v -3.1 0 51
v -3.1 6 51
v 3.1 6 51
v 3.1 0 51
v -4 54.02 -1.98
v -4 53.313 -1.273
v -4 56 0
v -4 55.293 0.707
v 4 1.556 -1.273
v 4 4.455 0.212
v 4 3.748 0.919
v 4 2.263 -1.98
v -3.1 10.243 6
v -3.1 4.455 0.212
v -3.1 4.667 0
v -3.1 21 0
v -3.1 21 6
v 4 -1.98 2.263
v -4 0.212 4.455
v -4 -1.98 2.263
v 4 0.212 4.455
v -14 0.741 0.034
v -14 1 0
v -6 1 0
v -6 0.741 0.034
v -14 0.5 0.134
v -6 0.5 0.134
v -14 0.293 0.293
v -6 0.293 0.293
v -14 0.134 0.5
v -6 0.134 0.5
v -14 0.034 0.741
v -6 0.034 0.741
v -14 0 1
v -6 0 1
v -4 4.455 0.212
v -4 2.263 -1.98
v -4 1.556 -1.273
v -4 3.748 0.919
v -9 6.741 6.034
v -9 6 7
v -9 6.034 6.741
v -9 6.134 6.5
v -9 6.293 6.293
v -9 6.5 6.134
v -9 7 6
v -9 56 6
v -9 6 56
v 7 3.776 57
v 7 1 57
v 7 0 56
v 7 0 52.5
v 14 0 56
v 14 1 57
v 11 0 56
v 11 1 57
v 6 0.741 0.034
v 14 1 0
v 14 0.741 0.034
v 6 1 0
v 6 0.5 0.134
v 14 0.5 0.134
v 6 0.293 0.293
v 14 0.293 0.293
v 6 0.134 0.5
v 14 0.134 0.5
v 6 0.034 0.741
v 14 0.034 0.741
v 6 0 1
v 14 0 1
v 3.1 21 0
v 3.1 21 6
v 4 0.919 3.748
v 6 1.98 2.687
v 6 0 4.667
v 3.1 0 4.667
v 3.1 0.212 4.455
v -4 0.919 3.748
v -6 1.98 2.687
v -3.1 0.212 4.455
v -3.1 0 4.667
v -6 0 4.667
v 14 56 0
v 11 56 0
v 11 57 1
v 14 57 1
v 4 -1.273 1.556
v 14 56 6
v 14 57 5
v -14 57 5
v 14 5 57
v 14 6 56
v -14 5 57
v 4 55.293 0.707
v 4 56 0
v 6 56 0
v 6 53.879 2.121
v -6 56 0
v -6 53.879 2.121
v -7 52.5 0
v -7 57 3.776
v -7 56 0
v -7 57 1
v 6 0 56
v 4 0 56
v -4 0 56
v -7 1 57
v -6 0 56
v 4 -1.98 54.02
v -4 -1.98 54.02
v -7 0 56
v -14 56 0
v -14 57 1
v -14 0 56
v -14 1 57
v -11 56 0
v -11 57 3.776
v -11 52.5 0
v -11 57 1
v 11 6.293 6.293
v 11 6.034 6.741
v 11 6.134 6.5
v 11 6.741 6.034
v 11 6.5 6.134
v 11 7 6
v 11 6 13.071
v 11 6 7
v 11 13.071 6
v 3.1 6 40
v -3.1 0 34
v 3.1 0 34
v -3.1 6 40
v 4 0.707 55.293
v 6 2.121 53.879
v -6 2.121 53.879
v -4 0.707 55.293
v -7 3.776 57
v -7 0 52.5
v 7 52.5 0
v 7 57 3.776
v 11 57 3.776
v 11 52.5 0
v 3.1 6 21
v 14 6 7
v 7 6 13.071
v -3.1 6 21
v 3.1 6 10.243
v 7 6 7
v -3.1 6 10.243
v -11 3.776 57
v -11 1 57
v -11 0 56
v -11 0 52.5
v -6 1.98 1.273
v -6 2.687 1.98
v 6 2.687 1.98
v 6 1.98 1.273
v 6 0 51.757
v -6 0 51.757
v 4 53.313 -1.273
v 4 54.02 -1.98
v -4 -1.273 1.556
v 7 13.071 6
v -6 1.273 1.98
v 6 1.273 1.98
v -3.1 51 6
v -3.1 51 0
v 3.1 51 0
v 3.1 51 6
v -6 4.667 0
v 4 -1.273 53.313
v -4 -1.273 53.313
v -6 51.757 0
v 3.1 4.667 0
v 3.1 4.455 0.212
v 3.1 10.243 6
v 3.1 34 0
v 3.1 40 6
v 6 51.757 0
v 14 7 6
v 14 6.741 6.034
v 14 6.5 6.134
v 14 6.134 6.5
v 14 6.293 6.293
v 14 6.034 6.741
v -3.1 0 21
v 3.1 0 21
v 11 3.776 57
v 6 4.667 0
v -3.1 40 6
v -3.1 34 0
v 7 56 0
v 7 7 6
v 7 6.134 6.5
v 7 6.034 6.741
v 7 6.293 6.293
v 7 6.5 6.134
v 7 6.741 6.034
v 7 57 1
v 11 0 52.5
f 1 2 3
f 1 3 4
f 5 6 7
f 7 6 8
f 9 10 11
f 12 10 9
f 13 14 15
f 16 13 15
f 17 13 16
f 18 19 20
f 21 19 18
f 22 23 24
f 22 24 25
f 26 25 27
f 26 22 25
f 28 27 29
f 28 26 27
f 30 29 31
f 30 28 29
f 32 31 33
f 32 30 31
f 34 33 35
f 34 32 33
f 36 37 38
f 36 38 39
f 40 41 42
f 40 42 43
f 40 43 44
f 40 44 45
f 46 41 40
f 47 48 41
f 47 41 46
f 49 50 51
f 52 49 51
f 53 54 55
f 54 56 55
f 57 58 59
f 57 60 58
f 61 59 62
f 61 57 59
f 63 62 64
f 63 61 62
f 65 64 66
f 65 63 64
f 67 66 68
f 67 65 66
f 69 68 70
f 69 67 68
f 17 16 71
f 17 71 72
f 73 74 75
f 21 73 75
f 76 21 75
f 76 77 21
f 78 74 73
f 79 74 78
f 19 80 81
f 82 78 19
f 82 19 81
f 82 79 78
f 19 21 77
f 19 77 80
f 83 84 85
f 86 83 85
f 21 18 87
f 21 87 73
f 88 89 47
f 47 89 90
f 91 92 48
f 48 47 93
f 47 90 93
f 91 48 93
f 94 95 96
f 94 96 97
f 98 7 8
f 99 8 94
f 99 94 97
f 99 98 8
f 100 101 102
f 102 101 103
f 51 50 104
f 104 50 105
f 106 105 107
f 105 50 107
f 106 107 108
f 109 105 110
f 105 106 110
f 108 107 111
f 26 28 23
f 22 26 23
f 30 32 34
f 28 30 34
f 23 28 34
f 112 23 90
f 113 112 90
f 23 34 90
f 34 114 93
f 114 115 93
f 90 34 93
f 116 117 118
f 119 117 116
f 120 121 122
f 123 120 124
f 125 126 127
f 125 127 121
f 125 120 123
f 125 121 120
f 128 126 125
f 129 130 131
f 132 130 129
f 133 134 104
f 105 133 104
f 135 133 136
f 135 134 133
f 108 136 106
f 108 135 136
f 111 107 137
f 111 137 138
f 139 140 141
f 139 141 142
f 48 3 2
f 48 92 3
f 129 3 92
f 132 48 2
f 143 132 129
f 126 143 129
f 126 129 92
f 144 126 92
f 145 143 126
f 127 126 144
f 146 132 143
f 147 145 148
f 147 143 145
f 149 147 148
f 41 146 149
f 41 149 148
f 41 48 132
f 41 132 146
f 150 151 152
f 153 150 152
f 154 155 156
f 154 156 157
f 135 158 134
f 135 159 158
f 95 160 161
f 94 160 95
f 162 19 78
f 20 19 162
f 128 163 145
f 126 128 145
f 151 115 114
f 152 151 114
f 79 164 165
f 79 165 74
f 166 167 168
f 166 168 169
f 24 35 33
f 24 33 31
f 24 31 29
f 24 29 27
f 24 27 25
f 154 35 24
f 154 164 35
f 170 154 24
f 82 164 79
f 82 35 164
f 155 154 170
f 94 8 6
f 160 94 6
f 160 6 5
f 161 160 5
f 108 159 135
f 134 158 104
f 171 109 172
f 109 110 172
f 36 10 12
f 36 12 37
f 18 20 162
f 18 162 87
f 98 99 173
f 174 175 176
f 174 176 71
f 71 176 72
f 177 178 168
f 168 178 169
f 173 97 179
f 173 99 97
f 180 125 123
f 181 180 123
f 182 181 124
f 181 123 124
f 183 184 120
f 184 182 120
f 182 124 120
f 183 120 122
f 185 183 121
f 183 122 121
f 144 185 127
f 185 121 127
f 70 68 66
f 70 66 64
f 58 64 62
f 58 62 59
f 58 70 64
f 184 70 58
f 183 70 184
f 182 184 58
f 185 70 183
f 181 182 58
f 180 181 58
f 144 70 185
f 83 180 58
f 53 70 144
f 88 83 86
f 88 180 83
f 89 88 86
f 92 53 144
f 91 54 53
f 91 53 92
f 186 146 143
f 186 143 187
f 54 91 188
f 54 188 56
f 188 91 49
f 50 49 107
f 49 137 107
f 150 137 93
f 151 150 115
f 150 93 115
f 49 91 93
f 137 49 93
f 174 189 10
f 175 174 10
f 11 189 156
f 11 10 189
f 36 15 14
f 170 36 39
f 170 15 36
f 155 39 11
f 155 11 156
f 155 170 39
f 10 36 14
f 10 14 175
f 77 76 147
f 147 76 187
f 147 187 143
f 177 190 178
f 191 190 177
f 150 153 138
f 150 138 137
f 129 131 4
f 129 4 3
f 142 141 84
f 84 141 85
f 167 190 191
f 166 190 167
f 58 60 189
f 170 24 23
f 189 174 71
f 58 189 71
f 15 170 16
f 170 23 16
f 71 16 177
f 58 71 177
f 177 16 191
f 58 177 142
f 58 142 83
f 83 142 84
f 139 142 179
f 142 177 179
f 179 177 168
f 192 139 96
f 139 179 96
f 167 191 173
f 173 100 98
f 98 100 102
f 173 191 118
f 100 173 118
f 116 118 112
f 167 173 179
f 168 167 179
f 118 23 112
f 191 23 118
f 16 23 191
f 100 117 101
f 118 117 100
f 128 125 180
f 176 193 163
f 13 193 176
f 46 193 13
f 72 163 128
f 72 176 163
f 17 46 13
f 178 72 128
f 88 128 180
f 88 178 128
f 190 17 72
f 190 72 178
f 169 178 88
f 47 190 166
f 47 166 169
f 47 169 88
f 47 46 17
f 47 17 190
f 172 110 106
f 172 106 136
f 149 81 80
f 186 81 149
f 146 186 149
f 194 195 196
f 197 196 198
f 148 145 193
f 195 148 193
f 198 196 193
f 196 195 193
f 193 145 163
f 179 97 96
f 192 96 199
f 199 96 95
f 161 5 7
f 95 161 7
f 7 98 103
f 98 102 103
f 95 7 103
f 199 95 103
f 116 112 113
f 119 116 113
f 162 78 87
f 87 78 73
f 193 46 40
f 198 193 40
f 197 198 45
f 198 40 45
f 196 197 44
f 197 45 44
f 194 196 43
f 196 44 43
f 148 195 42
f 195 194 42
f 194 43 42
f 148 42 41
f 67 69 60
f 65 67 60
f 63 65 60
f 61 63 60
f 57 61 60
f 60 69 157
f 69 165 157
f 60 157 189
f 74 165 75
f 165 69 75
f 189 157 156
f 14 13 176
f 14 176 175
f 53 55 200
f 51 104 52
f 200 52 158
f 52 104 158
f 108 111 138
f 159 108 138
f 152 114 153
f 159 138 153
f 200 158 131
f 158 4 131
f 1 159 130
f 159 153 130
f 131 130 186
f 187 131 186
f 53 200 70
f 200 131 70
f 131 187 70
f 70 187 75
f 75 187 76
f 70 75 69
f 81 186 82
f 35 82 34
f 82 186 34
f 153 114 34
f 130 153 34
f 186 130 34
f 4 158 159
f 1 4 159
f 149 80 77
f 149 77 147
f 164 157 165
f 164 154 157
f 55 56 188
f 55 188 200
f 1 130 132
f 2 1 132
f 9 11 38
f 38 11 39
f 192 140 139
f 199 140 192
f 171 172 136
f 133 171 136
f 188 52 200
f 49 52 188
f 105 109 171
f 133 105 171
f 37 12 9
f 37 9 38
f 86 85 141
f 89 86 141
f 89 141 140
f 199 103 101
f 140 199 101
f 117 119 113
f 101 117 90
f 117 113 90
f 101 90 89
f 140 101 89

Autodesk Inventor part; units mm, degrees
ref_plane "YZ Plane" through (0, 0, 0) normal (1, 0, 0) x (0, 1, 0)
ref_plane "XZ Plane" through (0, 0, 0) normal (0, 1, 0) x (-1, 0, 0)
ref_plane "XY Plane" through (0, 0, 0) normal (0, 0, 1) x (1, 0, 0)
sketch "Sketch_1" plane through (0, 0, 0) normal (1, 0, 0) x (0, 1, 0)
  line L0 (1, 57) -> (0, 56)
  line L1 (0, 56) -> (0, 1)
  arc A0 (0, 1) -> (1, 0) centre (1, 1) ccw
  line L2 (1, 0) -> (56, 0)
  line L3 (56, 0) -> (57, 1)
  line L4 (57, 1) -> (57, 5)
  line L5 (57, 5) -> (5, 57)
  line L6 (5, 57) -> (1, 57)
extrude "Extrusion1" add sketch "Sketch_1" along normal mid plane 28
sketch "Sketch_2" plane through (-9, 0, 0) normal (1, 0, 0) x (0, 0, -1)
  line L0 (-56, 6) -> (-7, 6)
  arc A0 (-7, 6) -> (-6, 7) centre (-7, 7) ccw
  line L1 (-6, 7) -> (-6, 56)
  line L2 (-6, 56) -> (-56, 6)
extrude "Extrusion2" cut sketch "Sketch_2" along normal blind 23
sketch "Sketch_3" plane through (0, 0, 0) normal (1, 0, 0) x (0, 1, 0)
  line L0 (0, 4.6669) -> (0, 1)
  arc A0 (0, 1) -> (1, 0) centre (1, 1) ccw
  line L1 (1, 0) -> (4.6669, 0)
  line L2 (4.6669, 0) -> (2.687, 1.9799)
  line L3 (2.687, 1.9799) -> (1.9799, 1.2728)
  line L4 (1.9799, 1.2728) -> (1.2728, 1.9799)
  line L5 (1.2728, 1.9799) -> (1.9799, 2.687)
  line L6 (1.9799, 2.687) -> (0, 4.6669)
extrude "Extrusion3" cut sketch "Sketch_3" along normal mid plane 12
sketch "Sketch_4" plane through (0, 0, 0) normal (1, 0, 0) x (0, 1, 0)
  line L0 (53.8787, 2.1213) -> (51.7574, 0)
  line L1 (51.7574, 0) -> (56, 0)
  line L2 (56, 0) -> (53.8787, 2.1213)
extrude "Extrusion4" cut sketch "Sketch_4" along normal mid plane 12
sketch "Sketch_5" plane through (0, 0, 0) normal (1, 0, 0) x (0, 1, 0)
  line L0 (0, 56) -> (0, 51.7574)
  line L1 (0, 51.7574) -> (2.1213, 53.8787)
  line L2 (2.1213, 53.8787) -> (0, 56)
extrude "Extrusion5" cut sketch "Sketch_5" along normal mid plane 12
sketch "Sketch_6" plane through (0, 0, 0) normal (1, 0, 0) x (0, 1, 0)
  line L0 (55.2929, 0.7071) -> (53.313, -1.2728)
  line L1 (53.313, -1.2728) -> (54.0201, -1.9799)
  line L2 (54.0201, -1.9799) -> (56, 0)
  line L3 (56, 0) -> (55.2929, 0.7071)
extrude "Extrusion6" add sketch "Sketch_6" along normal mid plane 8
sketch "Sketch22" plane through (0, -2.1213, 2.1213) normal (0, -0.7071, 0.7071) x (1, 0, 0)
  line L0 (-4, 3.3) -> (-4, 0.2)
  line L1 (-4, 0.2) -> (4, 0.2)
  line L2 (4, 0.2) -> (4, 3.3)
  line L3 (4, 3.3) -> (-4, 3.3)
extrude "Extrusion7" add sketch "Sketch22" against normal blind 1
sketch "Sketch25" plane through (0, 2.1213, -2.1213) normal (0, 0.7071, -0.7071) x (-1, 0, 0)
  line L0 (-4, 3.3) -> (-4, 0.2)
  line L1 (-4, 0.2) -> (4, 0.2)
  line L2 (4, 0.2) -> (4, 3.3)
  line L3 (4, 3.3) -> (-4, 3.3)
extrude "Extrusion8" add sketch "Sketch25" against normal blind 1
sketch "Sketch_7" plane through (0, 0, 0) normal (1, 0, 0) x (0, 1, 0)
  line L0 (0, 56) -> (-1.9799, 54.0201)
  line L1 (-1.9799, 54.0201) -> (-1.2728, 53.313)
  line L2 (-1.2728, 53.313) -> (0.7071, 55.2929)
  line L3 (0.7071, 55.2929) -> (0, 56)
extrude "Extrusion9" add sketch "Sketch_7" along normal mid plane 8
sketch "Sketch_8" plane through (-9, 0, 0) normal (1, 0, 0) x (0, 0, -1)
  line L0 (-57, 3.7759) -> (-57, 1)
  line L1 (-57, 1) -> (-56, 0)
  line L2 (-56, 0) -> (-52.5, 0)
  line L3 (-52.5, 0) -> (-57, 3.7759)
extrude "Extrusion10" cut sketch "Sketch_8" along normal mid plane 4
sketch "Sketch_9" plane through (-9, 0, 0) normal (1, 0, 0) x (0, 0, -1)
  line L0 (-3.7759, 57) -> (0, 52.5)
  line L1 (0, 52.5) -> (0, 56)
  line L2 (0, 56) -> (-1, 57)
  line L3 (-1, 57) -> (-3.7759, 57)
extrude "Extrusion11" cut sketch "Sketch_9" along normal mid plane 4
sketch "Sketch_16" plane through (9, 0, 0) normal (1, 0, 0) x (0, 0, -1)
  line L0 (-13.0711, 6) -> (-7, 6)
  arc A0 (-7, 6) -> (-6, 7) centre (-7, 7) ccw
  line L1 (-6, 7) -> (-6, 13.0711)
  line L2 (-6, 13.0711) -> (-13.0711, 6)
extrude "Extrusion12" add sketch "Sketch_16" along normal mid plane 4
sketch "Sketch_10" plane through (9, 0, 0) normal (1, 0, 0) x (0, 0, -1)
  line L0 (-3.7759, 57) -> (0, 52.5)
  line L1 (0, 52.5) -> (0, 56)
  line L2 (0, 56) -> (-1, 57)
  line L3 (-1, 57) -> (-3.7759, 57)
extrude "Extrusion13" cut sketch "Sketch_10" along normal mid plane 4
sketch "Sketch_11" plane through (9, 0, 0) normal (1, 0, 0) x (0, 0, -1)
  line L0 (-57, 1) -> (-56, 0)
  line L1 (-56, 0) -> (-52.5, 0)
  line L2 (-52.5, 0) -> (-57, 3.7759)
  line L3 (-57, 3.7759) -> (-57, 1)
extrude "Extrusion14" cut sketch "Sketch_11" along normal mid plane 4
sketch "Sketch_12" plane through (0, 0, 0) normal (1, 0, 0) x (0, 1, 0)
  line L0 (21, 6) -> (10.2426, 6)
  line L1 (10.2426, 6) -> (4.4548, 0.2121)
  line L2 (4.4548, 0.2121) -> (4.6669, 0)
  line L3 (4.6669, 0) -> (21, 0)
  line L4 (21, 0) -> (21, 6)
extrude "Extrusion15" cut sketch "Sketch_12" along normal mid plane 6.2
sketch "Sketch_13" plane through (0, 0, 0) normal (1, 0, 0) x (0, 1, 0)
  line L0 (0, 21) -> (0, 4.6669)
  line L1 (0, 4.6669) -> (0.2121, 4.4548)
  line L2 (0.2121, 4.4548) -> (6, 10.2426)
  line L3 (6, 10.2426) -> (6, 21)
  line L4 (6, 21) -> (0, 21)
extrude "Extrusion16" cut sketch "Sketch_13" along normal mid plane 6.2
sketch "Sketch_14" plane through (0, 0, 0) normal (1, 0, 0) x (0, 1, 0)
  line L0 (40, 6) -> (34, 0)
  line L1 (34, 0) -> (51, 0)
  line L2 (51, 0) -> (51, 6)
  line L3 (51, 6) -> (40, 6)
extrude "Extrusion17" cut sketch "Sketch_14" along normal mid plane 6.2
sketch "Sketch_15" plane through (0, 0, 0) normal (1, 0, 0) x (0, 1, 0)
  line L0 (0, 51) -> (0, 34)
  line L1 (0, 34) -> (6, 40)
  line L2 (6, 40) -> (6, 51)
  line L3 (6, 51) -> (0, 51)
extrude "Extrusion18" cut sketch "Sketch_15" along normal mid plane 6.2
properties part number "14070_m"
